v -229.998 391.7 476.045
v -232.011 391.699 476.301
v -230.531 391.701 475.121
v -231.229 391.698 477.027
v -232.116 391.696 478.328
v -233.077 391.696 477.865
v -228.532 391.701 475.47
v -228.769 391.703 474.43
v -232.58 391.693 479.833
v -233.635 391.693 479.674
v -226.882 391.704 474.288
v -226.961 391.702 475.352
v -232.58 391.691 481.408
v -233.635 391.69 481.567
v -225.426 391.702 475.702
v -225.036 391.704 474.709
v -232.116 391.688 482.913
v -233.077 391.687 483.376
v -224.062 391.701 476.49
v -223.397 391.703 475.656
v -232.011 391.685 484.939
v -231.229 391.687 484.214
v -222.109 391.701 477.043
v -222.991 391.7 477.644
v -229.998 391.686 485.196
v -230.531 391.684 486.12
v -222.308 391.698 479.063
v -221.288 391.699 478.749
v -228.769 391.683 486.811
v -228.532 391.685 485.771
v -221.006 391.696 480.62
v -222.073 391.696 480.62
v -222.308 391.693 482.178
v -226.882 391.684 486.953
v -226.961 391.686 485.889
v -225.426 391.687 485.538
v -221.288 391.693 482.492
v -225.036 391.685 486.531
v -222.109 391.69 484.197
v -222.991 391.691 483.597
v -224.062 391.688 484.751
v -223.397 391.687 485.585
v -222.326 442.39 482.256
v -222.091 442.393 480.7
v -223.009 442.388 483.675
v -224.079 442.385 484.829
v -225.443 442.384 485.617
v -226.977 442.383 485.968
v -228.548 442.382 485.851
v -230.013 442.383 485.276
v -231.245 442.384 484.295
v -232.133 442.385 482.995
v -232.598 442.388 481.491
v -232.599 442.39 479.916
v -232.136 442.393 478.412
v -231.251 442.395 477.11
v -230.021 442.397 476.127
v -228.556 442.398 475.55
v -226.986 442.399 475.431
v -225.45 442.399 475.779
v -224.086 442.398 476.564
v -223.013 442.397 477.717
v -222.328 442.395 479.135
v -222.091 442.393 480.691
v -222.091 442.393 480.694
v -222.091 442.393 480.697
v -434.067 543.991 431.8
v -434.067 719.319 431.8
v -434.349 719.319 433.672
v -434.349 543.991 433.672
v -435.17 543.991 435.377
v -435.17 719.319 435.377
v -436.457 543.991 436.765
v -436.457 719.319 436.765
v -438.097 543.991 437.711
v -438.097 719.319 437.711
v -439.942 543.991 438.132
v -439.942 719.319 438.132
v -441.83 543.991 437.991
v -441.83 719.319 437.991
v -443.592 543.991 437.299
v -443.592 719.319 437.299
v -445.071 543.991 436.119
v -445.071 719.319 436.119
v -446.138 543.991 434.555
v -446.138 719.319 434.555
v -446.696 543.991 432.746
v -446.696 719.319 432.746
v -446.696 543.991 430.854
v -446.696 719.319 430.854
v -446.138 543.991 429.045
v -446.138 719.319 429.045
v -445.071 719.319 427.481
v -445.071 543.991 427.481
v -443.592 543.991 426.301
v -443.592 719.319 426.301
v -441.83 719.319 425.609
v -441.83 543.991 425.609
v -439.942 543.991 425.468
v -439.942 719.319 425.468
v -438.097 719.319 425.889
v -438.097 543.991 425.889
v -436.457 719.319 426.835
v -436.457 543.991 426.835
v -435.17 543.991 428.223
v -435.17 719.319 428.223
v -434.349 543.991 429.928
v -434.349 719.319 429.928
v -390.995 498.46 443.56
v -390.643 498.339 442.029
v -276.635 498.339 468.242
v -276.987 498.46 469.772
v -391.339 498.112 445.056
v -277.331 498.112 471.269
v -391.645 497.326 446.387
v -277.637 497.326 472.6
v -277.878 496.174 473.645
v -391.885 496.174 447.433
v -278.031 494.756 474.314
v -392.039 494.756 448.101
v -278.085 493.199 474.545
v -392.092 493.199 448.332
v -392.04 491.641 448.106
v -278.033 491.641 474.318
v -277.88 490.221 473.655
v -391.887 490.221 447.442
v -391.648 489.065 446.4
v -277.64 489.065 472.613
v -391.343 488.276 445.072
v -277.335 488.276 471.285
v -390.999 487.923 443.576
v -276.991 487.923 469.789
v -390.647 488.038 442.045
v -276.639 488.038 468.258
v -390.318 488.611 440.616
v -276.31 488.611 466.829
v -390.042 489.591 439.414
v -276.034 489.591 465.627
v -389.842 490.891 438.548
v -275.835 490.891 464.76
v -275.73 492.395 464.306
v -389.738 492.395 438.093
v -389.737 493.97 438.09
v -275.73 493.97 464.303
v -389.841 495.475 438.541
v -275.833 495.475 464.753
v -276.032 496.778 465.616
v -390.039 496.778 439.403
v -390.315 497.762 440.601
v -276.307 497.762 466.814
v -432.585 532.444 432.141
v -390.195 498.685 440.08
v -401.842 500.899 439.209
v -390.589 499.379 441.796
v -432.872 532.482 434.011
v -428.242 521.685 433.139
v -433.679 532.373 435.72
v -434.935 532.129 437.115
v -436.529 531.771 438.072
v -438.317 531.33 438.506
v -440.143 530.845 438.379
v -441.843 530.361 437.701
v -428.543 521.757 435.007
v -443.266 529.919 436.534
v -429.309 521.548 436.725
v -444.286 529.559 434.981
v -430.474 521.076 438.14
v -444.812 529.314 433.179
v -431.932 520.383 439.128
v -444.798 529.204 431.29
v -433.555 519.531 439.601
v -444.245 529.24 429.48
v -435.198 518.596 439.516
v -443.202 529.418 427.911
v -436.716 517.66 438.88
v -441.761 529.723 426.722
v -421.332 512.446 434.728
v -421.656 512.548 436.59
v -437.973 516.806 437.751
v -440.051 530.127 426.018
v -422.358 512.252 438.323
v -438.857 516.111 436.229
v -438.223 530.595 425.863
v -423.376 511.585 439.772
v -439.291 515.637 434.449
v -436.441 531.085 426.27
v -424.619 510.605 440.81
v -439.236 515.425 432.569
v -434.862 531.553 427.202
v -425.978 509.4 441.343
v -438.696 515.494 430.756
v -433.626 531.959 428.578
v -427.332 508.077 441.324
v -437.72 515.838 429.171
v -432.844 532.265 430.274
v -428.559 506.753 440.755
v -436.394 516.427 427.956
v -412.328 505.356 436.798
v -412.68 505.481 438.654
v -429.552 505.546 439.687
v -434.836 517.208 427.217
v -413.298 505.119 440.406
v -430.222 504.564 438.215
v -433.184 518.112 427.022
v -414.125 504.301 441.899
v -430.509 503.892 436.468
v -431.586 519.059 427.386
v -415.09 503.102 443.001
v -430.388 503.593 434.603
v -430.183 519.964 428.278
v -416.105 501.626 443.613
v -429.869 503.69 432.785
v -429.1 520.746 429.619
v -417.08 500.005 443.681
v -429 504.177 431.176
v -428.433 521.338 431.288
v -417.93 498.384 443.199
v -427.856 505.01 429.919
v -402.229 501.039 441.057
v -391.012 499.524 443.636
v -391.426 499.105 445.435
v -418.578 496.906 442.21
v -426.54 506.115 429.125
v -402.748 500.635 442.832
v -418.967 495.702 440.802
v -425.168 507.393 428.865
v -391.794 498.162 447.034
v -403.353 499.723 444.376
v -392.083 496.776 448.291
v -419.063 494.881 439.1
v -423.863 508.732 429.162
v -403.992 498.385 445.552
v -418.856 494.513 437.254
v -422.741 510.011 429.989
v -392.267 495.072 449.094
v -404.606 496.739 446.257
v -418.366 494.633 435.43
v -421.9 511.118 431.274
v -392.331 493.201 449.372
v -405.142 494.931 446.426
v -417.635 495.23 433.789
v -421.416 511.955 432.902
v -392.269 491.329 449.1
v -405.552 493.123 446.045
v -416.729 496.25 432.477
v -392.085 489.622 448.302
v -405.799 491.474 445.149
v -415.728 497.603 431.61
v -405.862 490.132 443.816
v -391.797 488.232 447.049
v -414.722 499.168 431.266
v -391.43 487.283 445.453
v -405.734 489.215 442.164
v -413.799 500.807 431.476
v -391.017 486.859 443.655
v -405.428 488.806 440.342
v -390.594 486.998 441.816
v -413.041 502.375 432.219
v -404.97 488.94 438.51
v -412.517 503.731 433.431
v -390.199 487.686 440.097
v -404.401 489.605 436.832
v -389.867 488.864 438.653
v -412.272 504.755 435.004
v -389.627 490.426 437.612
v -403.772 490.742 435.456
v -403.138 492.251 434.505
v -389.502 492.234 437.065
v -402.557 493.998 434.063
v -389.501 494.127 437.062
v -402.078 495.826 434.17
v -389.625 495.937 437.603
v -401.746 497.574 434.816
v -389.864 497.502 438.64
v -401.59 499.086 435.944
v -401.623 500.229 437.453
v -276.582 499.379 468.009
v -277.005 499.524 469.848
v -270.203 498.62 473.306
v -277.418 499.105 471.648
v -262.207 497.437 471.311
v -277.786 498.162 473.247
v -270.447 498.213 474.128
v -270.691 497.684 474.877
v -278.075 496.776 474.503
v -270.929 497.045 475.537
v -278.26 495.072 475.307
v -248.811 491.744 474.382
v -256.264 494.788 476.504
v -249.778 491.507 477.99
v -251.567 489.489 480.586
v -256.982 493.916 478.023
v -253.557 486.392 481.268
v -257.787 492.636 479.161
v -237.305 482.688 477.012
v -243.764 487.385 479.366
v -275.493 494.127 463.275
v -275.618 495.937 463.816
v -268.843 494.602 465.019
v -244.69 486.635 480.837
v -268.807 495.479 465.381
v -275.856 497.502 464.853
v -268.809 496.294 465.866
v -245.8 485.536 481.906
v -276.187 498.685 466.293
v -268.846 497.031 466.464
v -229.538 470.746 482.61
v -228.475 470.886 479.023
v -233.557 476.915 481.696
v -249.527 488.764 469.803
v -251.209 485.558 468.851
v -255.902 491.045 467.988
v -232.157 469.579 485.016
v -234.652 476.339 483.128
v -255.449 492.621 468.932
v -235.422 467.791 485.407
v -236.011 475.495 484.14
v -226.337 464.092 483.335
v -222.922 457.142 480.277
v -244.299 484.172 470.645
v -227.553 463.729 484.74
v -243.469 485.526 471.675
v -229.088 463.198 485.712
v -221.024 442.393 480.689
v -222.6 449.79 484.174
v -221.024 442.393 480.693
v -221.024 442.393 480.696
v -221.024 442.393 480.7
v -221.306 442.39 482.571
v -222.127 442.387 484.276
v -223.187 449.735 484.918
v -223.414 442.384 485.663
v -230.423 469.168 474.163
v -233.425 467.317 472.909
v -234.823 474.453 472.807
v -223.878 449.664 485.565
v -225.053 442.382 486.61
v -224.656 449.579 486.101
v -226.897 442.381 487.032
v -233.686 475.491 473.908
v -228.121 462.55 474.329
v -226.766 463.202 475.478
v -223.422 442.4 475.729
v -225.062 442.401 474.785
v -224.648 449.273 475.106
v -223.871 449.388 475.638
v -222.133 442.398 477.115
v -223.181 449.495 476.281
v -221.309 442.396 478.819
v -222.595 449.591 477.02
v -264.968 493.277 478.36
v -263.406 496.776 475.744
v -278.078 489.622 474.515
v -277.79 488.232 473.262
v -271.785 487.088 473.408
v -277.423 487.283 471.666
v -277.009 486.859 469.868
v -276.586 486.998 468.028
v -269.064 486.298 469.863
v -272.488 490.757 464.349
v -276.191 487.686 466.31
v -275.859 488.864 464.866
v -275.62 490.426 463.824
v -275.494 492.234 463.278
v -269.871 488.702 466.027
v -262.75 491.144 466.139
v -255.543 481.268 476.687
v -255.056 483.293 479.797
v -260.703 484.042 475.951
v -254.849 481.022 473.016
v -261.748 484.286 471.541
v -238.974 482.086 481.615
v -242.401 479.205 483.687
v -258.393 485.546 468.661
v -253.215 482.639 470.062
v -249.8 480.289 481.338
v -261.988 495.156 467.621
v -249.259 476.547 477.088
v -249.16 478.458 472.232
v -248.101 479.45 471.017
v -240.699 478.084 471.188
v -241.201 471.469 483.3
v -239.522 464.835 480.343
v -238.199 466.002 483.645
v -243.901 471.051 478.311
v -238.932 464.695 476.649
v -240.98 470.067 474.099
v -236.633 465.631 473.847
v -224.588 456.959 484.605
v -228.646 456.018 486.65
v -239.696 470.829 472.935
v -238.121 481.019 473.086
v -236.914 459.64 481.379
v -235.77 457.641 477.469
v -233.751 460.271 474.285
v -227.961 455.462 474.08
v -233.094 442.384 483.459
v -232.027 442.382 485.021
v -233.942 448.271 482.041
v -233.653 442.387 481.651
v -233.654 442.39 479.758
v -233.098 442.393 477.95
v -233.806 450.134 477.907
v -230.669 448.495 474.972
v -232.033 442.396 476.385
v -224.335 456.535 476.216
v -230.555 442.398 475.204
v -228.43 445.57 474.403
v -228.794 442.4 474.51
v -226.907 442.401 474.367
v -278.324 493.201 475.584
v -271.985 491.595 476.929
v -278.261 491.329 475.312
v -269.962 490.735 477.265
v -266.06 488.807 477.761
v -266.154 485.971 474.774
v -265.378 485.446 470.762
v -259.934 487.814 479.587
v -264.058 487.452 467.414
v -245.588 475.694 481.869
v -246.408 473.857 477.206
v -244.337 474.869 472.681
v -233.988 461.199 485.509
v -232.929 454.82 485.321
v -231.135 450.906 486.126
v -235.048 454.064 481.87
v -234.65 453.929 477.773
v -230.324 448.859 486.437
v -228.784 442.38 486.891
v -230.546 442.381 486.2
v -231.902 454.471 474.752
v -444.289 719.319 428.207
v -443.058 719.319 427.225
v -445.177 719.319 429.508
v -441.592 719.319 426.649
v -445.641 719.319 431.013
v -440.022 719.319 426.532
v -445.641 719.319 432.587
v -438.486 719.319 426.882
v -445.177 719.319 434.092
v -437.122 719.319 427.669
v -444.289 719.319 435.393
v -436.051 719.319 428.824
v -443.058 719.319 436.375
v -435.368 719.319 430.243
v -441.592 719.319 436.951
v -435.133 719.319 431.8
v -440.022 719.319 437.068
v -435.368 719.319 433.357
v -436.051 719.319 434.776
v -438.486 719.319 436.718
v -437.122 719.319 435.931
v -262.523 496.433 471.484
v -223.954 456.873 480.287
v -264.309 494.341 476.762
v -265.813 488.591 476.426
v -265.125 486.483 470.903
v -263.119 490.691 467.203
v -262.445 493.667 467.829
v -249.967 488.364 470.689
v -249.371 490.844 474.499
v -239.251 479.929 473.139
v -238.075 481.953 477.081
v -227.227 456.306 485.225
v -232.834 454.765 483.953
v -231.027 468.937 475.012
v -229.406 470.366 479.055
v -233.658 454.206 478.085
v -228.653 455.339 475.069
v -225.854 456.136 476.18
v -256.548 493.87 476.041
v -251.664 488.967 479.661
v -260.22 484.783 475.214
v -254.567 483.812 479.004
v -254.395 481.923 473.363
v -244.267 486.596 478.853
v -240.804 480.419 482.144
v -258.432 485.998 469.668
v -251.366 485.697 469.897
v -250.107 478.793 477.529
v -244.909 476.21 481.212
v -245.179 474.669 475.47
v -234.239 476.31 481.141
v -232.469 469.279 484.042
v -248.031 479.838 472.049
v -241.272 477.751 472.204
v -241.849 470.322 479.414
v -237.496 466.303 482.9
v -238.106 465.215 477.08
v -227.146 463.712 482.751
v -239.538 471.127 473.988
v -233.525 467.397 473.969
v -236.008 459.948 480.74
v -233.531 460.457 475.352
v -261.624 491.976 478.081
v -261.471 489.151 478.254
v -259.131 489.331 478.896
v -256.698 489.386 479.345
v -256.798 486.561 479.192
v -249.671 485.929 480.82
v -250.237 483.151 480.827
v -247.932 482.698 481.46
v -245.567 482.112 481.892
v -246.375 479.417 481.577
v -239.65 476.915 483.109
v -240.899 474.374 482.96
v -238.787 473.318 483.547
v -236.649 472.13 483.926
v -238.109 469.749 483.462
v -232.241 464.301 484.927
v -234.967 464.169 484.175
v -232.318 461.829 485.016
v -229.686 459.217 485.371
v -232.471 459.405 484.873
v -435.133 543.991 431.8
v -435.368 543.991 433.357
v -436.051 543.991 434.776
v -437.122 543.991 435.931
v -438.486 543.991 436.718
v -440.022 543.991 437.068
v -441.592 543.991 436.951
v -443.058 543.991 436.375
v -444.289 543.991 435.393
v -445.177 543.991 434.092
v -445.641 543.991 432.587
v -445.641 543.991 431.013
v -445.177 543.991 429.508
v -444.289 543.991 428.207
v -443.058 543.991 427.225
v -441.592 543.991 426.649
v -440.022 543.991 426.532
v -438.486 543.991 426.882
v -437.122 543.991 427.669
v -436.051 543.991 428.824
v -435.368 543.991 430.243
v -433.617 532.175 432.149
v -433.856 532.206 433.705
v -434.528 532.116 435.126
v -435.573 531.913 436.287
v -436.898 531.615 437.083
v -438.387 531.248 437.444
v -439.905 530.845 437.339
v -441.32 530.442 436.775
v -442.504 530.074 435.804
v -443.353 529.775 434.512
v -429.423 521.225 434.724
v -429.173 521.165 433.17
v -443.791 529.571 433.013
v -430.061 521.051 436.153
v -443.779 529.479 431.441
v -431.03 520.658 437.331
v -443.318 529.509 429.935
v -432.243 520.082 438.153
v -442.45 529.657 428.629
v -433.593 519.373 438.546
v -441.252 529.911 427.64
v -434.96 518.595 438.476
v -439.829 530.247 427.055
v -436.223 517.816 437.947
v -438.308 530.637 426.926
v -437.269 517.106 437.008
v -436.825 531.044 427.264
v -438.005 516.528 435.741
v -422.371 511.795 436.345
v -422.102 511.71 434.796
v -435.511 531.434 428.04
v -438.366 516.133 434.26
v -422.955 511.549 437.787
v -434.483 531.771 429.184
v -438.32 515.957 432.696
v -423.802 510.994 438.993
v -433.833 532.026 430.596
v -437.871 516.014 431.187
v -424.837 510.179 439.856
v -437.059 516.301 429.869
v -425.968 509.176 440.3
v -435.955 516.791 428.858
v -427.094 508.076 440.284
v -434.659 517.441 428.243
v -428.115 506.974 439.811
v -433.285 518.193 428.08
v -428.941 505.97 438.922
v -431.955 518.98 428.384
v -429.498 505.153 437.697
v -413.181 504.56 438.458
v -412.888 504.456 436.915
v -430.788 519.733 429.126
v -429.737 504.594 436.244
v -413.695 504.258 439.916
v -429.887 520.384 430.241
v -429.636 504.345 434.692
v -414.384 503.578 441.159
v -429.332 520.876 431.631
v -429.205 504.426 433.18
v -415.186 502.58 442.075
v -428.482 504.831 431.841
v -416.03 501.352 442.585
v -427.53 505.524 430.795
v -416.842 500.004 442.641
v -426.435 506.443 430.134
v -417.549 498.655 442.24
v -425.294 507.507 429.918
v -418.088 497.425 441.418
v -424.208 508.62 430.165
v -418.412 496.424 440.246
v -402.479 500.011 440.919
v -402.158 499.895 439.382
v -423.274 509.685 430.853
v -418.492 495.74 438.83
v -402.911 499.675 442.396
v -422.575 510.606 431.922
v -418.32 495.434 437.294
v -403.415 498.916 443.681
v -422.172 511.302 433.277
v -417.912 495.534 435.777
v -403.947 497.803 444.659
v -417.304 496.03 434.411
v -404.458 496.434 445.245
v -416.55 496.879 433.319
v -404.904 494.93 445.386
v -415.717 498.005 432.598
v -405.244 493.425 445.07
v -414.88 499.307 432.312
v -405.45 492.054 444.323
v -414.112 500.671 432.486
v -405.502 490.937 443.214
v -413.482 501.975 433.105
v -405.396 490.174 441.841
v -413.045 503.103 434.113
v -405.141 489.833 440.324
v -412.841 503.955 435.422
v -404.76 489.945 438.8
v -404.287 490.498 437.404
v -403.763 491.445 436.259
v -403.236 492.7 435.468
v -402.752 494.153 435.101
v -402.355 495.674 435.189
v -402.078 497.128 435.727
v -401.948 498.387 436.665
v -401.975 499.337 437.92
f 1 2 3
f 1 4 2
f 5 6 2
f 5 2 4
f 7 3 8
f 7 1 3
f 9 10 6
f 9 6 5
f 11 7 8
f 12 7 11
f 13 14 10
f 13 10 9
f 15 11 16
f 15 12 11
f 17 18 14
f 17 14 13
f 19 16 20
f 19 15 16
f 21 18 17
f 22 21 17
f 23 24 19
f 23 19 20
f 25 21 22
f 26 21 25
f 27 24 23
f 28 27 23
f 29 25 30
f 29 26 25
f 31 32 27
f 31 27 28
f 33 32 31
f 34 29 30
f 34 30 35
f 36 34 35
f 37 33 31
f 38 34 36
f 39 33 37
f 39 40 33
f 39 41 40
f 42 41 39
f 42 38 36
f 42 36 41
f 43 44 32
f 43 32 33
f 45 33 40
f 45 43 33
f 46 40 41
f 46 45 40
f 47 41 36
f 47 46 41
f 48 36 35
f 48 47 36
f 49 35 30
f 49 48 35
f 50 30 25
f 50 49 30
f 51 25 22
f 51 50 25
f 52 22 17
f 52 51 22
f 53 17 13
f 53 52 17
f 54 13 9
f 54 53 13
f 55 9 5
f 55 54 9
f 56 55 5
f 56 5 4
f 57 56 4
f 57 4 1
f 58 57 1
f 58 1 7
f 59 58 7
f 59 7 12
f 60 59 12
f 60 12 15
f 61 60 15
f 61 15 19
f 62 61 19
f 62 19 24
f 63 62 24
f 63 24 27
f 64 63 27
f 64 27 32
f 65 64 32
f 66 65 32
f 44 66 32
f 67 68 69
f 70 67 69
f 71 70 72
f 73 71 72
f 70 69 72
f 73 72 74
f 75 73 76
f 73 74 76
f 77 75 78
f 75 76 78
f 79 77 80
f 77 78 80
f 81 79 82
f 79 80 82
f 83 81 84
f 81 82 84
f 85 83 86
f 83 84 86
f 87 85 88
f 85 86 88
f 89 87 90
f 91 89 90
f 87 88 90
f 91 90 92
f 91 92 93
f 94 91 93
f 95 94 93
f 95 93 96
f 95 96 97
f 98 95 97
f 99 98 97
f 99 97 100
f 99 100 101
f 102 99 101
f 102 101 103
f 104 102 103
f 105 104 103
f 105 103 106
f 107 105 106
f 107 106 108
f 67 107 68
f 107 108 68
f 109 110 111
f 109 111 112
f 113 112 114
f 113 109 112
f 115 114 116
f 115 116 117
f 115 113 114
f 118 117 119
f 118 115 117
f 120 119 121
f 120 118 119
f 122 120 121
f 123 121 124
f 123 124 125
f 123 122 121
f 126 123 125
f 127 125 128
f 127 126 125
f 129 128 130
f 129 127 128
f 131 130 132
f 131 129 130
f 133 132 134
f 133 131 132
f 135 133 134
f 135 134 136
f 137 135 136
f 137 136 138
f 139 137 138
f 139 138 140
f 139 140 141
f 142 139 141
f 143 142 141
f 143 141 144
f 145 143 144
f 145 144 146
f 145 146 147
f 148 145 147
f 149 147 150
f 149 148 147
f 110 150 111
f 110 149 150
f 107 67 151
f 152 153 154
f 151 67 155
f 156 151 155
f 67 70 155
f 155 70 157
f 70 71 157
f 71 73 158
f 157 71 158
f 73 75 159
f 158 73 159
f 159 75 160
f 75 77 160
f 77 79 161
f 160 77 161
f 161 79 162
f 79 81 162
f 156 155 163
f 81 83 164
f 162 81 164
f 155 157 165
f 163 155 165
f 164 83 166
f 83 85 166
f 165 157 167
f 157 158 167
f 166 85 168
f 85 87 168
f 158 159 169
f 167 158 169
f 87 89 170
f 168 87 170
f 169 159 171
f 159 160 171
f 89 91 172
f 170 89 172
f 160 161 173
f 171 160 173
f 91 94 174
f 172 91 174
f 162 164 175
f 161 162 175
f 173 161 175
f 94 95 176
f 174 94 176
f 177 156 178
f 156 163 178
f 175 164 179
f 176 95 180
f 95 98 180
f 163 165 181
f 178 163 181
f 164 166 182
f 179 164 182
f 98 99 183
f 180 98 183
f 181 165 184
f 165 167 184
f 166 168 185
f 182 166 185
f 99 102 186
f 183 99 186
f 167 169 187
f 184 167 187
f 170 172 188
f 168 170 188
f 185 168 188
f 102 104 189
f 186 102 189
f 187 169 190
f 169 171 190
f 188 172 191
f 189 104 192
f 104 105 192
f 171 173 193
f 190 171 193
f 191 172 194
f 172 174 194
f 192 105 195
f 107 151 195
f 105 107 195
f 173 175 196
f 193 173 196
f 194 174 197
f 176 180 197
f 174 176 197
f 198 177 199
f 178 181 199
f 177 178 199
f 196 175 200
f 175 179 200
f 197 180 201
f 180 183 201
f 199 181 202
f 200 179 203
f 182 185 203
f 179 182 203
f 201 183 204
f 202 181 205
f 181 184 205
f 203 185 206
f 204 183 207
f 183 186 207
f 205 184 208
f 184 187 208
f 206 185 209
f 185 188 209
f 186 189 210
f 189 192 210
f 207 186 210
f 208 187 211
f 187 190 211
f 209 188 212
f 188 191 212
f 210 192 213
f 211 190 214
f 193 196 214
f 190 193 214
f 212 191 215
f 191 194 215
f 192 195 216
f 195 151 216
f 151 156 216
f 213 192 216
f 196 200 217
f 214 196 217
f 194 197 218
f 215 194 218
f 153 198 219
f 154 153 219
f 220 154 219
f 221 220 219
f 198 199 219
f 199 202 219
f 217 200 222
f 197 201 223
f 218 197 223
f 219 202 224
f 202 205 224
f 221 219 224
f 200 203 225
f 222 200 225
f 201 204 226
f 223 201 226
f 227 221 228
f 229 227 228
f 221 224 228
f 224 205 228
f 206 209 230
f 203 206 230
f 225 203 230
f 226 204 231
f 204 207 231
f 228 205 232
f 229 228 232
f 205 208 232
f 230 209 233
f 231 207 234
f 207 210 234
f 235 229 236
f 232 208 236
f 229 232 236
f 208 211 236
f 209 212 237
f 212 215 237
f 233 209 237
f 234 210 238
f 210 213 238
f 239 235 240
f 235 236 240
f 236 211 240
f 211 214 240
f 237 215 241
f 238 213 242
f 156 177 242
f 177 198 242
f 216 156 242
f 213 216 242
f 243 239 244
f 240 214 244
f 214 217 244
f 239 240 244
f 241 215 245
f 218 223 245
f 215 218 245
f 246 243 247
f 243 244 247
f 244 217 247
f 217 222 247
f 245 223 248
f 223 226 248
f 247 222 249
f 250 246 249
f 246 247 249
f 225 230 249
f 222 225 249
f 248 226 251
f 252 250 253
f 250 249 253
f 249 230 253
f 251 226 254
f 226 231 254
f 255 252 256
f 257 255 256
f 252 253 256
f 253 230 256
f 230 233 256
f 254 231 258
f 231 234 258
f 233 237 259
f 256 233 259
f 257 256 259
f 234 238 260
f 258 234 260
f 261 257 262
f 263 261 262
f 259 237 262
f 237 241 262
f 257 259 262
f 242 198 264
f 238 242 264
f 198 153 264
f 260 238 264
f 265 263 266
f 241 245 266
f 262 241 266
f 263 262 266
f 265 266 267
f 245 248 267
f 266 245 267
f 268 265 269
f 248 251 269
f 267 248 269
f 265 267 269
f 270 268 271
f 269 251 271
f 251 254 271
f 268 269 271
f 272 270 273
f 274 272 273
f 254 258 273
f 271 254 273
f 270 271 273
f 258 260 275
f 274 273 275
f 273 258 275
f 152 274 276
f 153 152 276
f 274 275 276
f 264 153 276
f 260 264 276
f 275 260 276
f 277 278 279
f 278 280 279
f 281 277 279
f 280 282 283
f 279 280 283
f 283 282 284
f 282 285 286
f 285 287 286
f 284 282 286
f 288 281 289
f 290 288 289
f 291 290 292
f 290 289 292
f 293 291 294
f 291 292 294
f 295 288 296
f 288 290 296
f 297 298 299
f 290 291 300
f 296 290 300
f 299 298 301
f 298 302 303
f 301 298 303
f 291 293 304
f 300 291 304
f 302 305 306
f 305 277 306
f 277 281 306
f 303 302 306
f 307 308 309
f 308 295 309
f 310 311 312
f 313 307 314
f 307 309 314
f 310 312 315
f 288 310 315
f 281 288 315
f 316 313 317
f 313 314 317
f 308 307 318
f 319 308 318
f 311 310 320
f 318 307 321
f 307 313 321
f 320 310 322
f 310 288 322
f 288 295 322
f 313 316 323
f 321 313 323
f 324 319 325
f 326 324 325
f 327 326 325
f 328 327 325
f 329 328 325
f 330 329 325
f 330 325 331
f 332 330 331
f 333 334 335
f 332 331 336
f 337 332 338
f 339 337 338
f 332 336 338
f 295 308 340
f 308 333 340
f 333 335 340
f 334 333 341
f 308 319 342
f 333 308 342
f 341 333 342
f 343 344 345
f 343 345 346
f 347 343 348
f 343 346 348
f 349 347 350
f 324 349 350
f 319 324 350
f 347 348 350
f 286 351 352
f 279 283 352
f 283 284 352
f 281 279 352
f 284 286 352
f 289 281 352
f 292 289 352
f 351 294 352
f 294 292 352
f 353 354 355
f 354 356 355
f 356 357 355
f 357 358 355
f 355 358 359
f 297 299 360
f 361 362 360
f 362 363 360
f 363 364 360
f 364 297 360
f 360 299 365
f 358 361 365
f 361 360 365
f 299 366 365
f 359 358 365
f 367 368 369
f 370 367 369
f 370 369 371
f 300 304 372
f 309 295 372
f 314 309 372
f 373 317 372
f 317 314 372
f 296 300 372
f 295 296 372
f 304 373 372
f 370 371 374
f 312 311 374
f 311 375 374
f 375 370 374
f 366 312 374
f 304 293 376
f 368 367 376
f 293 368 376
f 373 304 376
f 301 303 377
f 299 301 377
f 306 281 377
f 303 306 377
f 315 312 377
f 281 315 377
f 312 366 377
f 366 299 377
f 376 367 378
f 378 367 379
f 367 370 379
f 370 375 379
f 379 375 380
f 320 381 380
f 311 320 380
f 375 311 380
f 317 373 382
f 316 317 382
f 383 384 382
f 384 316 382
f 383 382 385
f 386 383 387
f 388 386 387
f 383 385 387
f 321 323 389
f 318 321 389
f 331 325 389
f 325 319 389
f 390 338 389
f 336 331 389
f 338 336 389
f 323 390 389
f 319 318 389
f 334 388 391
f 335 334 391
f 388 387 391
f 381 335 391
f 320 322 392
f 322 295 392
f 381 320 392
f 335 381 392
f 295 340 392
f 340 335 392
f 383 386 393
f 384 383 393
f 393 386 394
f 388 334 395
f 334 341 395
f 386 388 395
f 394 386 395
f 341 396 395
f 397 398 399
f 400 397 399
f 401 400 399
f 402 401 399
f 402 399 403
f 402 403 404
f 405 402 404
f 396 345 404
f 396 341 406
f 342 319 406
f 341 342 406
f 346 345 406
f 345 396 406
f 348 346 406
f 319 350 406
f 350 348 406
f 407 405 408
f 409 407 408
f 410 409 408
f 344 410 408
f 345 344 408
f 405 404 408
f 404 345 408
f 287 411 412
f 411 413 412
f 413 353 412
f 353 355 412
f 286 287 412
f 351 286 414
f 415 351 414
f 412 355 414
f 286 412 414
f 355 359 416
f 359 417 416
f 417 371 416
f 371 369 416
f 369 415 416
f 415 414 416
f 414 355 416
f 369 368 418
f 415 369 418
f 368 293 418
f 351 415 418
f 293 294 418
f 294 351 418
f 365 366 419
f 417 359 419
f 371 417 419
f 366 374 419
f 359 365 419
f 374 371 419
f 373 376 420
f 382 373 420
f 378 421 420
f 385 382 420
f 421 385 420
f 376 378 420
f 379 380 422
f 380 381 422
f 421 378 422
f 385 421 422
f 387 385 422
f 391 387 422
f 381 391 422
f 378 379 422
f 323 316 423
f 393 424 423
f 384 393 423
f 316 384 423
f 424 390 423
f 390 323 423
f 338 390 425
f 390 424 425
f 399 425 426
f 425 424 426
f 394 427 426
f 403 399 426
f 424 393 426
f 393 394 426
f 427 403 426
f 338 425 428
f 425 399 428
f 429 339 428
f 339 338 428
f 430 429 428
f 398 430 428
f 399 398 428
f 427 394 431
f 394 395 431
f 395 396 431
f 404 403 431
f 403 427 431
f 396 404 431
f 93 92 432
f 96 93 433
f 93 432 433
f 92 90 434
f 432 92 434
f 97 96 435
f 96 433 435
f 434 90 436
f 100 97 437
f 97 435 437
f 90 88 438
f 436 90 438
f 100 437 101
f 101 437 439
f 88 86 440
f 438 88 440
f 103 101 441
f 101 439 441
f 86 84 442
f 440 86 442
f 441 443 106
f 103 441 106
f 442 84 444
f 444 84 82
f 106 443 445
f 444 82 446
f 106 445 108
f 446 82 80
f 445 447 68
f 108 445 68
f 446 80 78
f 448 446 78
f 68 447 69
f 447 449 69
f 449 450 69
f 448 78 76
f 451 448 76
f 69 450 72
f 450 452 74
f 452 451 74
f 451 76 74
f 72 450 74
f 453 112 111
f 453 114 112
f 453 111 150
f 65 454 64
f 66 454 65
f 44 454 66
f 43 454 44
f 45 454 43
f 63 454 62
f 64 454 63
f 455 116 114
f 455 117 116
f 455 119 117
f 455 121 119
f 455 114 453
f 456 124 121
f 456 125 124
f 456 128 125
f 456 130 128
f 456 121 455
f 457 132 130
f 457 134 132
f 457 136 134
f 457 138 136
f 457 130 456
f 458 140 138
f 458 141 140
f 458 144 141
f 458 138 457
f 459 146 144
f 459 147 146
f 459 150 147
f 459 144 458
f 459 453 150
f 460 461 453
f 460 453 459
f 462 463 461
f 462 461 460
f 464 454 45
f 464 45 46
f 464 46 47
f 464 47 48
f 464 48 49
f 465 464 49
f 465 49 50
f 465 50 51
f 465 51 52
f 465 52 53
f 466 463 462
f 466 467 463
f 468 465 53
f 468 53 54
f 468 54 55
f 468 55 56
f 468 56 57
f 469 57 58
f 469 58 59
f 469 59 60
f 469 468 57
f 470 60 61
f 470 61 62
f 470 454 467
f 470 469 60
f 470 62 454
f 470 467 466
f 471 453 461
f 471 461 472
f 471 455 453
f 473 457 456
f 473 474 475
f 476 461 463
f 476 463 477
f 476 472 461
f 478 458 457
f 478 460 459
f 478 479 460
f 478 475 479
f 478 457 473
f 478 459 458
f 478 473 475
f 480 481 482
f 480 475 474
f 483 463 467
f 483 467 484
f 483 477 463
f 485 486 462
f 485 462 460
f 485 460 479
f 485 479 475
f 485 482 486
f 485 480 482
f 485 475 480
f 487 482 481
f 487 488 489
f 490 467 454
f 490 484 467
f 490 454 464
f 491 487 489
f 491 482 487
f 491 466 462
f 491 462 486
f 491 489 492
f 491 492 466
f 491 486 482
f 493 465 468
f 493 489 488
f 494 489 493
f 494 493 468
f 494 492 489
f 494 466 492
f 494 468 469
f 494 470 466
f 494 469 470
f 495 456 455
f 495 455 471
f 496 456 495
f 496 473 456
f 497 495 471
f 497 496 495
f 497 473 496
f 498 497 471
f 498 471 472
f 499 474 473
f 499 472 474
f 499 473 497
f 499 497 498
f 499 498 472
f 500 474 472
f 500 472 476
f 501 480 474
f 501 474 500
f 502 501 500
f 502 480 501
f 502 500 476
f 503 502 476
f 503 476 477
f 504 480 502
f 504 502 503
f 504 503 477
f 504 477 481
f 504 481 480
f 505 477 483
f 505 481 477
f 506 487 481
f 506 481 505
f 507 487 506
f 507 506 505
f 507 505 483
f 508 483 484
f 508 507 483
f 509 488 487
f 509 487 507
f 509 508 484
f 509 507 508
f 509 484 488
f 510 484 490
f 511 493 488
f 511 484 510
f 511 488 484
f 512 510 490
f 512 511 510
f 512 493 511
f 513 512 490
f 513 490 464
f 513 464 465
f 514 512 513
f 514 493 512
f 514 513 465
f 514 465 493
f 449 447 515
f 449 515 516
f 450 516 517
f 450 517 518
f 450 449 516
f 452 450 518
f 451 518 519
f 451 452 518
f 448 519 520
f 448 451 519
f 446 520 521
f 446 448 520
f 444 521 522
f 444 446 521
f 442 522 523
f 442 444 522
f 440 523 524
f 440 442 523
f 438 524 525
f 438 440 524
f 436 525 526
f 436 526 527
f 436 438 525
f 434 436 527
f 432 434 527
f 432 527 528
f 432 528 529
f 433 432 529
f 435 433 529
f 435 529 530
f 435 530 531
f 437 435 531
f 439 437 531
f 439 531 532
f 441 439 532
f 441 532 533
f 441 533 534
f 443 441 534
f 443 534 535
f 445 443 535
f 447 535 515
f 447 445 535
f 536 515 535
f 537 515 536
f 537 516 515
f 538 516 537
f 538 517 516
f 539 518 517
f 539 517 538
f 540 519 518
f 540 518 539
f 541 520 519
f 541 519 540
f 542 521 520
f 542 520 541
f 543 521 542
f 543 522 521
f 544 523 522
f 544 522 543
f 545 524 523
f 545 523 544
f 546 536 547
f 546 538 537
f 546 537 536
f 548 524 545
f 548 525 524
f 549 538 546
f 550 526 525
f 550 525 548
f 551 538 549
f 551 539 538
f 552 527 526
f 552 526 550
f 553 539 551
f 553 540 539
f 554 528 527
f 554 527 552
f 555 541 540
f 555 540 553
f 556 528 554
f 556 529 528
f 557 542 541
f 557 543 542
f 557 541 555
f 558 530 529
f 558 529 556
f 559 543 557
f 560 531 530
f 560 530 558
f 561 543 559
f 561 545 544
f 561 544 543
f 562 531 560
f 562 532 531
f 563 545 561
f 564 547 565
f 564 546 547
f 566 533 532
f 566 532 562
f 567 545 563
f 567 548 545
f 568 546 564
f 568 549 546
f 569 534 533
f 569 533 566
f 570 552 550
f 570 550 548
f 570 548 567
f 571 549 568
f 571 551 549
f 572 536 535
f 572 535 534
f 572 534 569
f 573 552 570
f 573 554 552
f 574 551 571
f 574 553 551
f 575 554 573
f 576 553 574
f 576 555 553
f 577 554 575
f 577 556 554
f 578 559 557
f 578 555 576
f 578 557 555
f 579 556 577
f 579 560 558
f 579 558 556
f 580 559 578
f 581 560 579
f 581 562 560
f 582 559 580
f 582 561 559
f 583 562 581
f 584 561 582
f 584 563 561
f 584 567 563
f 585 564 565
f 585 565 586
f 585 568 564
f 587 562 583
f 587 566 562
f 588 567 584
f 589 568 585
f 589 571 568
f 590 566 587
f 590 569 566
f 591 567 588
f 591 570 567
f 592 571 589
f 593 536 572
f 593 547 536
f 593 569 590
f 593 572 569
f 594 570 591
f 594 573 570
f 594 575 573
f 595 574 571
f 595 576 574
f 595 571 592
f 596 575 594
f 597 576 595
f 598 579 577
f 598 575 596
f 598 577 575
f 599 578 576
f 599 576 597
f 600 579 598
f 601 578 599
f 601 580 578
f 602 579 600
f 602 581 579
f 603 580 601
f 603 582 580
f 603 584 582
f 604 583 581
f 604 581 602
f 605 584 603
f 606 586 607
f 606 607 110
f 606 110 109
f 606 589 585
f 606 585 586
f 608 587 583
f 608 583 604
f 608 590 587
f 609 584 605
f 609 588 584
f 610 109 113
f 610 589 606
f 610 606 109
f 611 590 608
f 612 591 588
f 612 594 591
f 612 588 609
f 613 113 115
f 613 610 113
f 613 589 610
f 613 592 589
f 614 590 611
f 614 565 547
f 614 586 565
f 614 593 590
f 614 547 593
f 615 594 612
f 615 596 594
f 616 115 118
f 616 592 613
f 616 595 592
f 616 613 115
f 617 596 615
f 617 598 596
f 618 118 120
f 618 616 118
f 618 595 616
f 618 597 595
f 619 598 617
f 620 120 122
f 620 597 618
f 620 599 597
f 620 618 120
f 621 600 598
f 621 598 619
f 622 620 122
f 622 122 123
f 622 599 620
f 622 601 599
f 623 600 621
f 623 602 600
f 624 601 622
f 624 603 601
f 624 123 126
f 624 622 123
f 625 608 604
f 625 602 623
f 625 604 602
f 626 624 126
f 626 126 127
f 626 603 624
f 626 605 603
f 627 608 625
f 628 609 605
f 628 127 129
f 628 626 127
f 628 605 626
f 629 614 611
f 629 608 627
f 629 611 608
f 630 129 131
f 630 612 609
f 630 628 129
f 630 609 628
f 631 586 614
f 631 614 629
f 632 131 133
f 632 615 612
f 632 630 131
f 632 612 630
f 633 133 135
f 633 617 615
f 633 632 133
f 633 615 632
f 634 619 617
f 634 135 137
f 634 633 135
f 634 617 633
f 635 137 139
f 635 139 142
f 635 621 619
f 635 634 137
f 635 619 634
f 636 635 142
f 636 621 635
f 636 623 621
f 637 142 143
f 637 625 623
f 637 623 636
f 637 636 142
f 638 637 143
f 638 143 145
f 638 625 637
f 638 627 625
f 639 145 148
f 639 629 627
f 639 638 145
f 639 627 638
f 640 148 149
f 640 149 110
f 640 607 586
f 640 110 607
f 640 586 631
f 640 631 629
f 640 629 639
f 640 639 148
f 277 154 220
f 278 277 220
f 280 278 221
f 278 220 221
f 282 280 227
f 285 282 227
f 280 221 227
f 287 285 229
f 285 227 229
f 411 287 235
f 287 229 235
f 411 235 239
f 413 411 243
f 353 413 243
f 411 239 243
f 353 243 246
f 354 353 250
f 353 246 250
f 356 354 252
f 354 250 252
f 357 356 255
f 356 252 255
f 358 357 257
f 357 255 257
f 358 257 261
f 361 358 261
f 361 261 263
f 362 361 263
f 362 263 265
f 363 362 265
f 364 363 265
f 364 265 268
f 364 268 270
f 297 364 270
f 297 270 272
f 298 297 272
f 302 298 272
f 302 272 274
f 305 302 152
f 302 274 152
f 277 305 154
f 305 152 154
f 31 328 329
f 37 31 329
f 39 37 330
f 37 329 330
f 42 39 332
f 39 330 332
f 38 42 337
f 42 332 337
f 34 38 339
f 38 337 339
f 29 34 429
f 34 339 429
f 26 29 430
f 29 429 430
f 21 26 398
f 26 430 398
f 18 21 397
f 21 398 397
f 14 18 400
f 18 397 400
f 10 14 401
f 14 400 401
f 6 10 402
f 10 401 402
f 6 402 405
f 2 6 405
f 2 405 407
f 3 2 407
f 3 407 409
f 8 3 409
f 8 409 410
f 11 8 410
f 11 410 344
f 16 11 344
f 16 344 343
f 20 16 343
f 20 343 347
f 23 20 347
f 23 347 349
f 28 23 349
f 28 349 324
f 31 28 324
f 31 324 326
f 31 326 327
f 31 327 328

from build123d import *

# Parameters (mm, degrees)
SKETCH1_R                 = 6.35
SKETCH1_R_2               = 5.2832
PIPE_0_5_SCH_40_1_DEPTH   = 175.328598267
SKETCH1_ON_SEGMENT_2_R    = 6.35
SKETCH1_ON_SEGMENT_2_R_2  = 5.2832
PIPE_0_5_SCH_40_1_2_ANGLE = 90
SKETCH1_ON_SEGMENT_3_R    = 6.35
SKETCH1_ON_SEGMENT_3_R_2  = 5.2832
PIPE_0_5_SCH_40_1_3_DEPTH = 116.982148253
SKETCH1_ON_SEGMENT_4_R    = 6.35
SKETCH1_ON_SEGMENT_4_R_2  = 5.2832
PIPE_0_5_SCH_40_1_4_ANGLE = 90
SKETCH1_ON_SEGMENT_5_R    = 6.35
SKETCH1_ON_SEGMENT_5_R_2  = 5.2832
PIPE_0_5_SCH_40_1_5_DEPTH = 50.697047229


with BuildPart() as part:
    # Sketch1 → Pipe 0.5 SCH 40(1) (new body)
    with BuildSketch(Plane(origin=(-440.41650414, 719.319181201, 431.8), x_dir=(1, 0, 0), z_dir=(0, -1, 0))):
        Circle(SKETCH1_R)
        Circle(SKETCH1_R_2, mode=Mode.SUBTRACT)
    extrude(amount=PIPE_0_5_SCH_40_1_DEPTH)


with BuildPart() as body_2:
    # Sketch1 on segment 2 (carried to the start of arc 2) → Pipe 0.5 SCH 40_1 2 (revolve)
    with BuildSketch(Plane(origin=(-440.41650414, 543.990582935, 431.8), x_dir=(1, 0, 0), z_dir=(0, -1, 0))):
        Circle(SKETCH1_ON_SEGMENT_2_R)
        Circle(SKETCH1_ON_SEGMENT_2_R_2, mode=Mode.SUBTRACT)
    revolve(axis=Axis((-390.908254533, 543.990582935, 443.183023362), (-0.224075263, 0, 0.974571843)), revolution_arc=PIPE_0_5_SCH_40_1_2_ANGLE)


with BuildPart() as body_3:
    # Sketch1 on segment 3 (carried to segment 3) → Pipe 0.5 SCH 40_1 3 (new body)
    with BuildSketch(Plane(origin=(-390.908254533, 493.190582935, 443.183023362), x_dir=(0.050209724, 0.974571843, -0.218377442), z_dir=(0.974571843, 0, 0.224075263))):
        Circle(SKETCH1_ON_SEGMENT_3_R)
        Circle(SKETCH1_ON_SEGMENT_3_R_2, mode=Mode.SUBTRACT)
    extrude(amount=PIPE_0_5_SCH_40_1_3_DEPTH)


with BuildPart() as body_4:
    # Sketch1 on segment 4 (carried to the start of arc 4) → Pipe 0.5 SCH 40_1 4 (revolve)
    with BuildSketch(Plane(origin=(-276.900746752, 493.190582935, 469.395829002), x_dir=(0.050209724, 0.974571843, -0.218377442), z_dir=(0.974571843, 0, 0.224075263))):
        Circle(SKETCH1_ON_SEGMENT_4_R)
        Circle(SKETCH1_ON_SEGMENT_4_R_2, mode=Mode.SUBTRACT)
    revolve(axis=Axis((-276.882509946, 442.39064813, 469.316511553), (0.224074975, 0.001602106, -0.974570592)), revolution_arc=PIPE_0_5_SCH_40_1_4_ANGLE)


with BuildPart() as body_5:
    # Sketch1 on segment 5 (carried to segment 5) → Pipe 0.5 SCH 40_1 5 (new body)
    with BuildSketch(Plane(origin=(-227.374260339, 442.39064813, 480.699534915), x_dir=(0.999999936, 0.000358992, 2.8e-07), z_dir=(0.000358992, -0.999998717, -0.001561367))):
        Circle(SKETCH1_ON_SEGMENT_5_R)
        Circle(SKETCH1_ON_SEGMENT_5_R_2, mode=Mode.SUBTRACT)
    extrude(amount=PIPE_0_5_SCH_40_1_5_DEPTH)


with BuildPart() as part_1:
    add(part.part)

    # Pipe 0.5 SCH 40(1) as one body: union body 2, body 3, body 4, body 5
    add(body_2.part)
    add(body_3.part)
    add(body_4.part)
    add(body_5.part)


solid = part_1.part
